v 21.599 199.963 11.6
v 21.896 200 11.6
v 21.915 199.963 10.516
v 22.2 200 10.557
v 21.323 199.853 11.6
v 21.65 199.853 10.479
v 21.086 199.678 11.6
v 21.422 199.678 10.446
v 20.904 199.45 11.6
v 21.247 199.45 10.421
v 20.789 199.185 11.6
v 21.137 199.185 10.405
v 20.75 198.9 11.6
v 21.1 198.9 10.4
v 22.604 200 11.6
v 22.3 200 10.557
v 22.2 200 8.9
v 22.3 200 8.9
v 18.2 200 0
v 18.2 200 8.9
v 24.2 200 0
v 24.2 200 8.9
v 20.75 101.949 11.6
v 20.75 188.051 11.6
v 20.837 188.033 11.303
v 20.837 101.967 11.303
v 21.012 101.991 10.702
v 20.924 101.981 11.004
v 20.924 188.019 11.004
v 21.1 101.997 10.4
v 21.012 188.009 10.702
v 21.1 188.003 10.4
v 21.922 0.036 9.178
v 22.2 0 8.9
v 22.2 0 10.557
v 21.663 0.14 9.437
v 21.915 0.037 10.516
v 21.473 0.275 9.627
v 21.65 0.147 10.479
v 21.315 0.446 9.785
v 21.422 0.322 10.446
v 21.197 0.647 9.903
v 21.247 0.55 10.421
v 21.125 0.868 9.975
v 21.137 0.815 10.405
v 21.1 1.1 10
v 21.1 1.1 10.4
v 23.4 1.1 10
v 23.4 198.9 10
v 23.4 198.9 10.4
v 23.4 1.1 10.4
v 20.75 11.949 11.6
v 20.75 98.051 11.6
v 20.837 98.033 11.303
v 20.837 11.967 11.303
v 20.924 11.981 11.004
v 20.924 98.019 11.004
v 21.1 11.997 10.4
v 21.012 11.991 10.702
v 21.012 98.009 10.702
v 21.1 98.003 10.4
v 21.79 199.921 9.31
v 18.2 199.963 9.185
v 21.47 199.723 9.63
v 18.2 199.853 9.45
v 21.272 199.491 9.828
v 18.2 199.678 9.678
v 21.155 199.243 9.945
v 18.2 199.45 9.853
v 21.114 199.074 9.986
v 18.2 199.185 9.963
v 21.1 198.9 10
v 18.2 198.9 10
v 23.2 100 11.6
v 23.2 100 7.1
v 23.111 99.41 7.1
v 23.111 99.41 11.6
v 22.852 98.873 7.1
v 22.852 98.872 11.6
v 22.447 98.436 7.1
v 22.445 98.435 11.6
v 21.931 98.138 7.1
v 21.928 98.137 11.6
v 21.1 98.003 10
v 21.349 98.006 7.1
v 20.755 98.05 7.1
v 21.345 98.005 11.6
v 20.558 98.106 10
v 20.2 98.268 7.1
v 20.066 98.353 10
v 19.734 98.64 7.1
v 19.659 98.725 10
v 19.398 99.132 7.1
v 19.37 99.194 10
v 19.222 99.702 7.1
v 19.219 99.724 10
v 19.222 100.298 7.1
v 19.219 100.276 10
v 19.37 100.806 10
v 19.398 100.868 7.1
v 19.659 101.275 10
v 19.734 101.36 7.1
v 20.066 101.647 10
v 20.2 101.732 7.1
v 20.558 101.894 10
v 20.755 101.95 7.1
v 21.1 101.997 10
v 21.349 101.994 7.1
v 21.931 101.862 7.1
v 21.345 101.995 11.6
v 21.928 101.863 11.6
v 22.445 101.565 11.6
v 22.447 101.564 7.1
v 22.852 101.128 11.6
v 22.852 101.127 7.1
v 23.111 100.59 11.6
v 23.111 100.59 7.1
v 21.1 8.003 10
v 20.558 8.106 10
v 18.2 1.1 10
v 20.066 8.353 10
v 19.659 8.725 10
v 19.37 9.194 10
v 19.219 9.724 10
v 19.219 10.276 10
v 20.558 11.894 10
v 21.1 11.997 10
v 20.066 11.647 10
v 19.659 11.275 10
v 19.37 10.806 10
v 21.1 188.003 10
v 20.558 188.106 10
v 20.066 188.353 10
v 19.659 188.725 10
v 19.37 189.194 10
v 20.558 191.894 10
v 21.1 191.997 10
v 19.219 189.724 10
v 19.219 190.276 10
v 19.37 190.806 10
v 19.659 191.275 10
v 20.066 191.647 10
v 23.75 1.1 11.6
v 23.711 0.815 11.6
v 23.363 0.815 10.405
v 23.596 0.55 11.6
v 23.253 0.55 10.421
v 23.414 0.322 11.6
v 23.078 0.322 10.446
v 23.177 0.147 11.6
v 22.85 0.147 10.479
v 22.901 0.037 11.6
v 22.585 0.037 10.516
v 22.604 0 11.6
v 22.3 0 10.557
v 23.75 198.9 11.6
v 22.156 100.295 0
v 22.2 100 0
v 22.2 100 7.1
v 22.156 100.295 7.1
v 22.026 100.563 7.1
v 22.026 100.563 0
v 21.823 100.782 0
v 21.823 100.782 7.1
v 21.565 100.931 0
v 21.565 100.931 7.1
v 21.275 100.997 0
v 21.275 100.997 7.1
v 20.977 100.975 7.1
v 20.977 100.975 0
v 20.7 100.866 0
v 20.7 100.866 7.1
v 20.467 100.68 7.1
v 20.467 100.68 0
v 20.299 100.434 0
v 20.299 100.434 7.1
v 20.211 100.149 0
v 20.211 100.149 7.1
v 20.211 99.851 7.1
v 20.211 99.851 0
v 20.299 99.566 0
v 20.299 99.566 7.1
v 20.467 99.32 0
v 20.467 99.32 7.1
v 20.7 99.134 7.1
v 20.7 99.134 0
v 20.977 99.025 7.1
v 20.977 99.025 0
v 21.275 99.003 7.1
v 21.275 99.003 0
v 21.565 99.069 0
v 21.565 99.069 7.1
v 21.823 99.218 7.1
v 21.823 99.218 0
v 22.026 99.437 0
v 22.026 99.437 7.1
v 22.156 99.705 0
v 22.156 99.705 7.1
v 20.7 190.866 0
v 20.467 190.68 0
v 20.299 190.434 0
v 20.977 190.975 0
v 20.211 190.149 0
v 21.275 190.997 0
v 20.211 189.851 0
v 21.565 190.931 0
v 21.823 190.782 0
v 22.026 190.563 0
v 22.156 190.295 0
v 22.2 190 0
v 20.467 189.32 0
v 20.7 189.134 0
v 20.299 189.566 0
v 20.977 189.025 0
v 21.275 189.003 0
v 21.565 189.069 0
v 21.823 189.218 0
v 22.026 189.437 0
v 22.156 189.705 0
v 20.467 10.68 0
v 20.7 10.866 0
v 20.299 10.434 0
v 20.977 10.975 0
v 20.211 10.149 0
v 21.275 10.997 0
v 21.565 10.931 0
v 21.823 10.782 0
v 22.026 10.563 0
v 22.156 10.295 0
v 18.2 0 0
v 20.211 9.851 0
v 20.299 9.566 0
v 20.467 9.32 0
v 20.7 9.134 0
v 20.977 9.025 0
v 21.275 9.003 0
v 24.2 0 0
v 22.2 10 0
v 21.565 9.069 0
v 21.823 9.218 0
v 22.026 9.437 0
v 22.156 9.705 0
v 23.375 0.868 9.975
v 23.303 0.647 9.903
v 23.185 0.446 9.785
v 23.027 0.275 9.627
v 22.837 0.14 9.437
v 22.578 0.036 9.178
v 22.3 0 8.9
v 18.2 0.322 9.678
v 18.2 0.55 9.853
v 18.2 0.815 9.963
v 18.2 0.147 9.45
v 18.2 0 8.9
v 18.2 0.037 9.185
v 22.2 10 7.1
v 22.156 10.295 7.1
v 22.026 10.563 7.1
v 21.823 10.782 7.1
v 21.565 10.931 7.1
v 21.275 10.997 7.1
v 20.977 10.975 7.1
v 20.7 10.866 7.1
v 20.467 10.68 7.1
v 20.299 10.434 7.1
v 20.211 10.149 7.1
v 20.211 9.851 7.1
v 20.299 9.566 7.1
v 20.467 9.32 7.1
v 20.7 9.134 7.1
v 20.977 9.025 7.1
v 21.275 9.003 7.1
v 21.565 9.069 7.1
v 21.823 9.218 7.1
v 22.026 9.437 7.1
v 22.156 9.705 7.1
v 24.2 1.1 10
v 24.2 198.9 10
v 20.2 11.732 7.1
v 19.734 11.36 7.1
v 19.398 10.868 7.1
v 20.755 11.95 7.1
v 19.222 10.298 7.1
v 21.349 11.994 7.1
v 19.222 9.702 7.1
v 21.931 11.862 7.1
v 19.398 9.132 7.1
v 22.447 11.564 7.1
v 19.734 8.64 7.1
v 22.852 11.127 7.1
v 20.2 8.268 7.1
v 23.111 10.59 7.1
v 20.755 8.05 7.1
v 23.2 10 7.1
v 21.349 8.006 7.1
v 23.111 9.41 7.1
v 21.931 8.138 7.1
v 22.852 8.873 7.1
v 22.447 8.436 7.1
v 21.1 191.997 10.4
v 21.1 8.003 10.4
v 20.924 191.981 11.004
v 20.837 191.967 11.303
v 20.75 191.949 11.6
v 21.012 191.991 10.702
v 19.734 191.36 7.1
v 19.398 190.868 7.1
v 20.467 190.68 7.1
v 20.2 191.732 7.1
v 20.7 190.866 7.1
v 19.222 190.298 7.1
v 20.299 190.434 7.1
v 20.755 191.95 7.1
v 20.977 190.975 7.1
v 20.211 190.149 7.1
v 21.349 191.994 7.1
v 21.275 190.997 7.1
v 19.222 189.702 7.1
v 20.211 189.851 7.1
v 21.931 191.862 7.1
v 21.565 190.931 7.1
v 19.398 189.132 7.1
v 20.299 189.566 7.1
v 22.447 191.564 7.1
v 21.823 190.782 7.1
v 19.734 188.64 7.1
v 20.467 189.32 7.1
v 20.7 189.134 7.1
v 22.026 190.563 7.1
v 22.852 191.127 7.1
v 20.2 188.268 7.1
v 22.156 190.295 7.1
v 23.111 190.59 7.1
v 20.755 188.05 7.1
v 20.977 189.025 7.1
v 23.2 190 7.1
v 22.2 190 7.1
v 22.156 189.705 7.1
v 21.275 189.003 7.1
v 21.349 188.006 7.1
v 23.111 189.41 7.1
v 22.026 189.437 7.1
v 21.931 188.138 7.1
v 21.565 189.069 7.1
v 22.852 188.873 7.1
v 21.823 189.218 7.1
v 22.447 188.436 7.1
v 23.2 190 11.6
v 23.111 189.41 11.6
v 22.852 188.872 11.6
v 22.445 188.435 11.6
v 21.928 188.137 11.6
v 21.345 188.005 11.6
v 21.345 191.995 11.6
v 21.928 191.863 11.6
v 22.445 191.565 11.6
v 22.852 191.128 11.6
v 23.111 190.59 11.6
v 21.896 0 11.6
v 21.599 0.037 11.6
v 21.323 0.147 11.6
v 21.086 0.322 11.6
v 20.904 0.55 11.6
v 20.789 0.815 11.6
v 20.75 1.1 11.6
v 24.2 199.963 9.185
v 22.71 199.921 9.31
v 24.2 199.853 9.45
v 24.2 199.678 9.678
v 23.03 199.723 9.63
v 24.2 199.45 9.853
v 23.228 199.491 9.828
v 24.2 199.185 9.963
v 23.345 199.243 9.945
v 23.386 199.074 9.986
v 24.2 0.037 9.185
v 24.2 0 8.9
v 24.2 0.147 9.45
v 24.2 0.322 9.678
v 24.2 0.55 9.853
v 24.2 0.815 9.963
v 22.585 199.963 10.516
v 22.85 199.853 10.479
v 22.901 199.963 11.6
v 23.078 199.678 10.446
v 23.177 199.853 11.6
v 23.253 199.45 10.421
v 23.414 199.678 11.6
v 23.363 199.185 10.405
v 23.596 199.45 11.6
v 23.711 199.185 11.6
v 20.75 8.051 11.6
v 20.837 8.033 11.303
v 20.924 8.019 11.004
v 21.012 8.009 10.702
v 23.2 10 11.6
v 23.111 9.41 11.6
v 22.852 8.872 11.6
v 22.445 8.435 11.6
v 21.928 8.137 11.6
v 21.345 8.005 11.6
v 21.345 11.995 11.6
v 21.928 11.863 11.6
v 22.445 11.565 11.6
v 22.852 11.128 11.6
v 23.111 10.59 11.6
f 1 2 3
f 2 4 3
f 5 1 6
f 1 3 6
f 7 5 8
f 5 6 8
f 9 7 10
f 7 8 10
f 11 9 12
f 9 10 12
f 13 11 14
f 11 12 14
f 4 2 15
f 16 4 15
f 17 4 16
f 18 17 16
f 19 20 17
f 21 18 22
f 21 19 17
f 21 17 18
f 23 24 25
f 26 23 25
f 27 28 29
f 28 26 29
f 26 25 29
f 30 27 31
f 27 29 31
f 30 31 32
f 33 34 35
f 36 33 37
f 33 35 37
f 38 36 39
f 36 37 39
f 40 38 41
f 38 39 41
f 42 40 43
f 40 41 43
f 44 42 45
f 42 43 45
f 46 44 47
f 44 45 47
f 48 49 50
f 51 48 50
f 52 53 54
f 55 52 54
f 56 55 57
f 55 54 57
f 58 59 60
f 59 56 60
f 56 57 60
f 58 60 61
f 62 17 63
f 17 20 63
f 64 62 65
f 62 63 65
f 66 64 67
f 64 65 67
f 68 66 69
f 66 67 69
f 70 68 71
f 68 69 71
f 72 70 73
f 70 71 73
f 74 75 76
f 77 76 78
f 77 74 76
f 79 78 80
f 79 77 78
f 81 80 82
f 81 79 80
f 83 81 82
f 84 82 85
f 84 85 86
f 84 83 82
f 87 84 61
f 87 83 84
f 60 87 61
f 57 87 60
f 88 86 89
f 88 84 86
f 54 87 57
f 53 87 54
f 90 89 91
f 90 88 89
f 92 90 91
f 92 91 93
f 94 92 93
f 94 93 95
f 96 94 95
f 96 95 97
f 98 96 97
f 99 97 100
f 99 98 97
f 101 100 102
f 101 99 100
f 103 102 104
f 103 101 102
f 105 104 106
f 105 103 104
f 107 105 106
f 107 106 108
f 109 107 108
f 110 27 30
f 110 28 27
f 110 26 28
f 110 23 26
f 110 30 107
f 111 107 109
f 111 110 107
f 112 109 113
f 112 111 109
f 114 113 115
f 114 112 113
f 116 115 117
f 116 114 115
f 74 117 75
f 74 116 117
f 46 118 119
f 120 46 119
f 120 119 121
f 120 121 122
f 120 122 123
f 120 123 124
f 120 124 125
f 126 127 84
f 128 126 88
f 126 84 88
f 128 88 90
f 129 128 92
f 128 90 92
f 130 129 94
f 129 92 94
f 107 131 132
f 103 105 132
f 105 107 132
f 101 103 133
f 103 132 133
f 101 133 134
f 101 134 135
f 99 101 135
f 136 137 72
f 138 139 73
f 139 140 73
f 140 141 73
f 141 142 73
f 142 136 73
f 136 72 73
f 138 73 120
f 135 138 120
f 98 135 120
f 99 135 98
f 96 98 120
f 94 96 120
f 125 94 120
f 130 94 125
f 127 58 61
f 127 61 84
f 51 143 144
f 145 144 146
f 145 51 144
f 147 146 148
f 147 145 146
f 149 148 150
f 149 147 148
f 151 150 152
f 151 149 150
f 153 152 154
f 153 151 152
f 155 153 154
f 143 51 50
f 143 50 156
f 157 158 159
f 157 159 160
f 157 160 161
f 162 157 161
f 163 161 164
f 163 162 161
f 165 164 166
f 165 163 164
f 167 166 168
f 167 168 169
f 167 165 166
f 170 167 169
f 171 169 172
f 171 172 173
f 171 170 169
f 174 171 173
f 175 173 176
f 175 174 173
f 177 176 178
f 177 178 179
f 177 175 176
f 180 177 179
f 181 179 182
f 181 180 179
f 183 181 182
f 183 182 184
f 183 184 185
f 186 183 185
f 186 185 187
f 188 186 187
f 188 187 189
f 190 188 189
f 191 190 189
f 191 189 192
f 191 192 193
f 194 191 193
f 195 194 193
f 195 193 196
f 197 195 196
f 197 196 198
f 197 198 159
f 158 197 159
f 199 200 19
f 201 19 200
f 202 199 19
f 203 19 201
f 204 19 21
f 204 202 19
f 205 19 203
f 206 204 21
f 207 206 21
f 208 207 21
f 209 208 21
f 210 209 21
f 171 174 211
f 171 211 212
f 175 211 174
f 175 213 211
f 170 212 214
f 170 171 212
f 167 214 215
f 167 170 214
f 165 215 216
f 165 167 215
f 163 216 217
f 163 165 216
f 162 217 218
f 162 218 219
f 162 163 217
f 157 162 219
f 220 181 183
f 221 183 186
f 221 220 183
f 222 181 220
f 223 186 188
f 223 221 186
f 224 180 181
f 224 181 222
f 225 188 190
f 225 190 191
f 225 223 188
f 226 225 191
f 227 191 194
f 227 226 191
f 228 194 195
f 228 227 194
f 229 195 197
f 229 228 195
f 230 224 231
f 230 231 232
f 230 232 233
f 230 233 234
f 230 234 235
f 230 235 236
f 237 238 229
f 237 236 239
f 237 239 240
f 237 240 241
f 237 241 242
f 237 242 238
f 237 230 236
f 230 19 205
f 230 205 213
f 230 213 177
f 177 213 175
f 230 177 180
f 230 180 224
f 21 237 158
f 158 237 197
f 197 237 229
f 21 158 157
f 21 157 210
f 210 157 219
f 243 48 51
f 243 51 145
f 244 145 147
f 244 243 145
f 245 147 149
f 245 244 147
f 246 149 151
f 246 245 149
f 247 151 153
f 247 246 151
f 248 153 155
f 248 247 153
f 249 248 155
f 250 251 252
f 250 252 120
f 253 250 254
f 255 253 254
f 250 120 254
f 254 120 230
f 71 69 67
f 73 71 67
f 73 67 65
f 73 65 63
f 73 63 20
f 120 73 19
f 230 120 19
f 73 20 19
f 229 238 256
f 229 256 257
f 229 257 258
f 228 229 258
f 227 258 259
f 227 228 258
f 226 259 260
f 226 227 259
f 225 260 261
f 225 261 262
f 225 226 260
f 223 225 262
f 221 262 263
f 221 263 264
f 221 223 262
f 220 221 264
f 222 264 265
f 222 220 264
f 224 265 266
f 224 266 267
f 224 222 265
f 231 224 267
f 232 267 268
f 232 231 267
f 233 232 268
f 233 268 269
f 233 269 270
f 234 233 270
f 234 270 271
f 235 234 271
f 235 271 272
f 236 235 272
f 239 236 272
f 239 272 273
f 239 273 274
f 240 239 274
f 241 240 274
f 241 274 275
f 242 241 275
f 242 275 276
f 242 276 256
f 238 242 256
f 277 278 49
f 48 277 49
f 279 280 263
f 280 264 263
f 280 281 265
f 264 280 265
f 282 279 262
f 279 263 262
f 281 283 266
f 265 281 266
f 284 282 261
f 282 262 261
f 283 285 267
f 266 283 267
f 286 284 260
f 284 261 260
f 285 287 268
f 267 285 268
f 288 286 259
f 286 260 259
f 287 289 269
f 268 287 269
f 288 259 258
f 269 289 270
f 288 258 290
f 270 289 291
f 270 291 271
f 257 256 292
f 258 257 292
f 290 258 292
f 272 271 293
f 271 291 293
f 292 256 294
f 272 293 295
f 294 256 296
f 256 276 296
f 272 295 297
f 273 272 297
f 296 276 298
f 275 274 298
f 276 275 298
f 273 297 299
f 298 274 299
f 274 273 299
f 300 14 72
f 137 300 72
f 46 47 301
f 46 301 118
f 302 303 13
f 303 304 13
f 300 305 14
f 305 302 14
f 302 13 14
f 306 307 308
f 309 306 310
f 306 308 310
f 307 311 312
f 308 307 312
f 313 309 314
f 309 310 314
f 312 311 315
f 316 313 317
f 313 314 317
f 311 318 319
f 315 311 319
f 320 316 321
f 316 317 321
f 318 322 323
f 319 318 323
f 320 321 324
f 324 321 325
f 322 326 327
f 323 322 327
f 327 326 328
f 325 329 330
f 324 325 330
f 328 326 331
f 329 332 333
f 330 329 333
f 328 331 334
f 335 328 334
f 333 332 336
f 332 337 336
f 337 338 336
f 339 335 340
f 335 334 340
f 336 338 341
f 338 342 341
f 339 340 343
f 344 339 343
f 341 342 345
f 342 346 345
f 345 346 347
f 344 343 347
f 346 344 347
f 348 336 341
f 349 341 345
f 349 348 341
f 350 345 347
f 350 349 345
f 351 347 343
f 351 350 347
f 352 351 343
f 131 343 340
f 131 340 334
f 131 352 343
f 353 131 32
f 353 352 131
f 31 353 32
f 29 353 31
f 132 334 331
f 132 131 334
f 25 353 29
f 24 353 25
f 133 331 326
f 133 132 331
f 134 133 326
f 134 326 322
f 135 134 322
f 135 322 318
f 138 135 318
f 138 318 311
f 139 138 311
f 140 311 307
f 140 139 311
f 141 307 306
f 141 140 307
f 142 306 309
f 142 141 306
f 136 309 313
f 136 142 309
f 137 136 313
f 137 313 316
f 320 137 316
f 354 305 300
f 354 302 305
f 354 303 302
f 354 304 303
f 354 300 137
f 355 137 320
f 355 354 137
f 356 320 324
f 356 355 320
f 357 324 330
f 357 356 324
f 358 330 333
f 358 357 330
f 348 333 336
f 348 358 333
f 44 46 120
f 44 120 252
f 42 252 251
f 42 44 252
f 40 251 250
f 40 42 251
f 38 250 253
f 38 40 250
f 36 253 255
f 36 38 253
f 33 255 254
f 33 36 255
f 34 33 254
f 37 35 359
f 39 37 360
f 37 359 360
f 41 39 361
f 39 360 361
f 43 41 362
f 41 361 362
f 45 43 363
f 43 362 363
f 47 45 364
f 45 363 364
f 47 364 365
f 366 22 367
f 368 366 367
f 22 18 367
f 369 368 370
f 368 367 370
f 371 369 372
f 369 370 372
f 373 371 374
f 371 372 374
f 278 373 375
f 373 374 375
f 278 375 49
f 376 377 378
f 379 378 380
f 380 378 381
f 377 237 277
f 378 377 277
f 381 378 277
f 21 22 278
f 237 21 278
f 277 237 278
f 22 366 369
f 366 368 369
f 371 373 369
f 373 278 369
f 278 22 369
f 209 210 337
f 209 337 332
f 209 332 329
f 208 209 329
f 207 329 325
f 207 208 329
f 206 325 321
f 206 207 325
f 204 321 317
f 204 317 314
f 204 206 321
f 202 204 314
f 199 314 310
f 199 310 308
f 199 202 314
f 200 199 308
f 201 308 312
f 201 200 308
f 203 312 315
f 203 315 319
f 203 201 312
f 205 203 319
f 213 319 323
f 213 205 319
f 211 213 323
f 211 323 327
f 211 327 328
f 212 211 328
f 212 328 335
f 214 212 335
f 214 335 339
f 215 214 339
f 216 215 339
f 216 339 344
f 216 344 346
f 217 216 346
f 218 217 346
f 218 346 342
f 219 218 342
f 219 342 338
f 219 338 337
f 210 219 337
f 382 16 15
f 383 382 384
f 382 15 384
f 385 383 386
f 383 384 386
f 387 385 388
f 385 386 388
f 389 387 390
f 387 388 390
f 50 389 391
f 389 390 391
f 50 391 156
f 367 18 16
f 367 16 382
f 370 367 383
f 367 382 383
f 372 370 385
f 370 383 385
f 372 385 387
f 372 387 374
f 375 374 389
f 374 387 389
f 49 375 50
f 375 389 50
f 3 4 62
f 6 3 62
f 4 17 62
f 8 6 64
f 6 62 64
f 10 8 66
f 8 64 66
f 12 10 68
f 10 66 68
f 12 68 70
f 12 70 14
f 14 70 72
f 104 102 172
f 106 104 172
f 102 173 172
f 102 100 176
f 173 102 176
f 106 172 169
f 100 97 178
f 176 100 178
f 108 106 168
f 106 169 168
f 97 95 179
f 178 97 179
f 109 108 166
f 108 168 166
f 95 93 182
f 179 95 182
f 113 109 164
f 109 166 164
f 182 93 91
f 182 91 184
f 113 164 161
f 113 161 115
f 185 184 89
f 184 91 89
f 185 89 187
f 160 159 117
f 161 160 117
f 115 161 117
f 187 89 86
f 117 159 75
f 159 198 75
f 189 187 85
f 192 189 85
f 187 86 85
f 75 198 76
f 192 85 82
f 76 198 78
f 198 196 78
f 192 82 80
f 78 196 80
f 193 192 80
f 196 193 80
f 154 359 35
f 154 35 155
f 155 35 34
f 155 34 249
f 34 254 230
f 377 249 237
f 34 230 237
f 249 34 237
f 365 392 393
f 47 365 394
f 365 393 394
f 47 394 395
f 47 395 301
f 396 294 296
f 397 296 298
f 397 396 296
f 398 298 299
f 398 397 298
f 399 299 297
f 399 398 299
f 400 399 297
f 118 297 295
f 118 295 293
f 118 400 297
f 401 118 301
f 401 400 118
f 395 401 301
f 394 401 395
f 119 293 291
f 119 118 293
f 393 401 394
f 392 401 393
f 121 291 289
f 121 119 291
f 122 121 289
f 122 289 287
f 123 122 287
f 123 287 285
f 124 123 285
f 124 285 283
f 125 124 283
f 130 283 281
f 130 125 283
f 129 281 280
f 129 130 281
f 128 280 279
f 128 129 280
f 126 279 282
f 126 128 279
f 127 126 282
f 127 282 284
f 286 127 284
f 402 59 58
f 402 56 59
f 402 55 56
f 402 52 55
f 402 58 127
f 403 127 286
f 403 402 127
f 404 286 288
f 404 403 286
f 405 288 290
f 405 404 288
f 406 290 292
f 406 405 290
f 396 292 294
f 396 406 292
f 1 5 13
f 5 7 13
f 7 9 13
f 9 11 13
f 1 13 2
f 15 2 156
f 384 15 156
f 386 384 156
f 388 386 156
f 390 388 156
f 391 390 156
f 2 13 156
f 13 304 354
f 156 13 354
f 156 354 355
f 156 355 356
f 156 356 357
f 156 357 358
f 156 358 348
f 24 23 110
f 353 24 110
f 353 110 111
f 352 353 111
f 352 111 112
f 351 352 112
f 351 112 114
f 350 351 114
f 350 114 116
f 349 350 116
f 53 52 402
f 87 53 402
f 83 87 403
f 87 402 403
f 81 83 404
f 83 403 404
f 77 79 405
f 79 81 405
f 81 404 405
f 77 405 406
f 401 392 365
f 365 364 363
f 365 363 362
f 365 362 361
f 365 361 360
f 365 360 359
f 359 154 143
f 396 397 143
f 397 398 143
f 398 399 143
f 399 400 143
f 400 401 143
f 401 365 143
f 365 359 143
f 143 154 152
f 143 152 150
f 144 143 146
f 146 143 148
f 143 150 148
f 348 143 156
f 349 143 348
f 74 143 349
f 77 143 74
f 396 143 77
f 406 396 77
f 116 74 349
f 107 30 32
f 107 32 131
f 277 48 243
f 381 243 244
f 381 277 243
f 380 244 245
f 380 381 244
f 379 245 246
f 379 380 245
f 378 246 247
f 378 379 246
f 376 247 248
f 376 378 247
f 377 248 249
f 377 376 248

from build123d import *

# Parameters (mm, degrees)
BOX_W                             = 70
BOX_H                             = 200
BOX_DEPTH                         = 11.6
POCKET_DEPTH                      = 200.001
LINEARPATTERN_COUNT               = 5
LINEARPATTERN_PITCH               = 14.5
SKETCH_W                          = 82.408782
SKETCH_H                          = 38.885188
SKETCH_W_2                        = 6
SKETCH_H_2                        = 21.094656
POCKET001_DEPTH                   = 200.001
SKETCH003_R                       = 1
POCKET002_DEPTH                   = 5.201
SKETCH004_R                       = 1
POCKET003_DEPTH                   = 15
SKETCH005_R                       = 2
POCKET004_DEPTH                   = 4.5
FILLET_R                          = 1.1
PART_MIRRORING001_PLACEMENT_ANGLE = 180


with BuildPart() as fillet_body:
    # Box → Box (new body)
    with BuildSketch(Plane(origin=(-7.5, 0, 0), x_dir=(1, 0, 0), z_dir=(0, 0, 1))):
        with Locations((35, 100)):
            Rectangle(BOX_W, BOX_H)
    extrude(amount=BOX_DEPTH)

    # Sketch002 → Pocket (cut, through all)
    with BuildSketch(Plane(origin=(-7.5, 0, 0), x_dir=(1, 0, 0), z_dir=(0, -1, 0))):
        Polygon((14.1, 10), (11.2, 10), (11.2, 3), (2.7, 3), (2.7, 10), (1.9, 10), (1.9, 10.4), (2.25, 11.6), (13.75, 11.6), (14.1, 10.4), align=None)
    pocket = extrude(amount=-POCKET_DEPTH, mode=Mode.SUBTRACT)

    # LinearPattern: Pocket ×5
    with Locations(*[(i * LINEARPATTERN_PITCH, 0, 0) for i in range(1, LINEARPATTERN_COUNT)]):
        add(pocket, mode=Mode.SUBTRACT)

    # Sketch → Pocket001 (cut, through all)
    with BuildSketch(Plane(origin=(-7.5, 0, 0), x_dir=(1, 0, 0), z_dir=(0, -1, 0))):
        with Locations((35.413628, 6.289411)):
            Rectangle(SKETCH_W, SKETCH_H)
        with Locations((14.2, 4.644143)):
            Rectangle(SKETCH_W_2, SKETCH_H_2, mode=Mode.SUBTRACT)
    extrude(amount=-POCKET001_DEPTH, mode=Mode.SUBTRACT)

    # Sketch003 → Pocket002 (cut, through all)
    with BuildSketch(Plane.YZ.offset(8.9)):
        with Locations((21.45, -100)):
            Circle(SKETCH003_R)
        with Locations((21.45, -10)):
            Circle(SKETCH003_R)
        with Locations((21.45, -190)):
            Circle(SKETCH003_R)
    extrude(amount=-POCKET002_DEPTH, mode=Mode.SUBTRACT)

    # Sketch004 → Pocket003 (cut)
    with BuildSketch(Plane(origin=(-7.5, 0, 0), x_dir=(1, 0, 0), z_dir=(0, 0, -1))):
        with Locations((14.2, -190)):
            Circle(SKETCH004_R)
        with Locations((14.2, -100)):
            Circle(SKETCH004_R)
        with Locations((14.2, -10)):
            Circle(SKETCH004_R)
    extrude(amount=-POCKET003_DEPTH, mode=Mode.SUBTRACT)

    # Sketch005 → Pocket004 (cut)
    with BuildSketch(Plane(origin=(-7.5, 0, 11.6), x_dir=(1, 0, 0), z_dir=(0, 0, 1))):
        with Locations((14.2, 190)):
            Circle(SKETCH005_R)
        with Locations((14.2, 100)):
            Circle(SKETCH005_R)
        with Locations((14.2, 10)):
            Circle(SKETCH005_R)
    extrude(amount=-POCKET004_DEPTH, mode=Mode.SUBTRACT)

    # Fillet
    fillet_edges = [fillet_body.edges().sort_by_distance(p)[0] for p in [
        (5.15, 0, 10),
        (6.6, 0, 10.2),
        (6.425, 0, 11),
        (9.3, 0, 10),
        (8.9, 0, 10.2),
        (9.075, 0, 11),
        (5.15, 200, 10),
        (6.6, 200, 10.2),
        (6.425, 200, 11),
        (9.075, 200, 11),
        (8.9, 200, 10.2),
        (9.3, 200, 10),
    ]]
    fillet(fillet_edges, radius=FILLET_R)


with BuildPart() as part_mirroring001:
    # Part__Mirroring001: instance of Fillet body
    add(fillet_body.part.mirror(Plane(origin=(0, 0, 0), x_dir=(0, -1, 0), z_dir=(1, 0, 0))))


with BuildPart() as part_mirroring001_1:
    # Part__Mirroring001 placement: moved
    add(part_mirroring001.part.moved(Location((14.5, 200, 0))).rotate(Axis((14.5, 200, 0), (0, 0, 1)), PART_MIRRORING001_PLACEMENT_ANGLE))


solid = part_mirroring001_1.part
